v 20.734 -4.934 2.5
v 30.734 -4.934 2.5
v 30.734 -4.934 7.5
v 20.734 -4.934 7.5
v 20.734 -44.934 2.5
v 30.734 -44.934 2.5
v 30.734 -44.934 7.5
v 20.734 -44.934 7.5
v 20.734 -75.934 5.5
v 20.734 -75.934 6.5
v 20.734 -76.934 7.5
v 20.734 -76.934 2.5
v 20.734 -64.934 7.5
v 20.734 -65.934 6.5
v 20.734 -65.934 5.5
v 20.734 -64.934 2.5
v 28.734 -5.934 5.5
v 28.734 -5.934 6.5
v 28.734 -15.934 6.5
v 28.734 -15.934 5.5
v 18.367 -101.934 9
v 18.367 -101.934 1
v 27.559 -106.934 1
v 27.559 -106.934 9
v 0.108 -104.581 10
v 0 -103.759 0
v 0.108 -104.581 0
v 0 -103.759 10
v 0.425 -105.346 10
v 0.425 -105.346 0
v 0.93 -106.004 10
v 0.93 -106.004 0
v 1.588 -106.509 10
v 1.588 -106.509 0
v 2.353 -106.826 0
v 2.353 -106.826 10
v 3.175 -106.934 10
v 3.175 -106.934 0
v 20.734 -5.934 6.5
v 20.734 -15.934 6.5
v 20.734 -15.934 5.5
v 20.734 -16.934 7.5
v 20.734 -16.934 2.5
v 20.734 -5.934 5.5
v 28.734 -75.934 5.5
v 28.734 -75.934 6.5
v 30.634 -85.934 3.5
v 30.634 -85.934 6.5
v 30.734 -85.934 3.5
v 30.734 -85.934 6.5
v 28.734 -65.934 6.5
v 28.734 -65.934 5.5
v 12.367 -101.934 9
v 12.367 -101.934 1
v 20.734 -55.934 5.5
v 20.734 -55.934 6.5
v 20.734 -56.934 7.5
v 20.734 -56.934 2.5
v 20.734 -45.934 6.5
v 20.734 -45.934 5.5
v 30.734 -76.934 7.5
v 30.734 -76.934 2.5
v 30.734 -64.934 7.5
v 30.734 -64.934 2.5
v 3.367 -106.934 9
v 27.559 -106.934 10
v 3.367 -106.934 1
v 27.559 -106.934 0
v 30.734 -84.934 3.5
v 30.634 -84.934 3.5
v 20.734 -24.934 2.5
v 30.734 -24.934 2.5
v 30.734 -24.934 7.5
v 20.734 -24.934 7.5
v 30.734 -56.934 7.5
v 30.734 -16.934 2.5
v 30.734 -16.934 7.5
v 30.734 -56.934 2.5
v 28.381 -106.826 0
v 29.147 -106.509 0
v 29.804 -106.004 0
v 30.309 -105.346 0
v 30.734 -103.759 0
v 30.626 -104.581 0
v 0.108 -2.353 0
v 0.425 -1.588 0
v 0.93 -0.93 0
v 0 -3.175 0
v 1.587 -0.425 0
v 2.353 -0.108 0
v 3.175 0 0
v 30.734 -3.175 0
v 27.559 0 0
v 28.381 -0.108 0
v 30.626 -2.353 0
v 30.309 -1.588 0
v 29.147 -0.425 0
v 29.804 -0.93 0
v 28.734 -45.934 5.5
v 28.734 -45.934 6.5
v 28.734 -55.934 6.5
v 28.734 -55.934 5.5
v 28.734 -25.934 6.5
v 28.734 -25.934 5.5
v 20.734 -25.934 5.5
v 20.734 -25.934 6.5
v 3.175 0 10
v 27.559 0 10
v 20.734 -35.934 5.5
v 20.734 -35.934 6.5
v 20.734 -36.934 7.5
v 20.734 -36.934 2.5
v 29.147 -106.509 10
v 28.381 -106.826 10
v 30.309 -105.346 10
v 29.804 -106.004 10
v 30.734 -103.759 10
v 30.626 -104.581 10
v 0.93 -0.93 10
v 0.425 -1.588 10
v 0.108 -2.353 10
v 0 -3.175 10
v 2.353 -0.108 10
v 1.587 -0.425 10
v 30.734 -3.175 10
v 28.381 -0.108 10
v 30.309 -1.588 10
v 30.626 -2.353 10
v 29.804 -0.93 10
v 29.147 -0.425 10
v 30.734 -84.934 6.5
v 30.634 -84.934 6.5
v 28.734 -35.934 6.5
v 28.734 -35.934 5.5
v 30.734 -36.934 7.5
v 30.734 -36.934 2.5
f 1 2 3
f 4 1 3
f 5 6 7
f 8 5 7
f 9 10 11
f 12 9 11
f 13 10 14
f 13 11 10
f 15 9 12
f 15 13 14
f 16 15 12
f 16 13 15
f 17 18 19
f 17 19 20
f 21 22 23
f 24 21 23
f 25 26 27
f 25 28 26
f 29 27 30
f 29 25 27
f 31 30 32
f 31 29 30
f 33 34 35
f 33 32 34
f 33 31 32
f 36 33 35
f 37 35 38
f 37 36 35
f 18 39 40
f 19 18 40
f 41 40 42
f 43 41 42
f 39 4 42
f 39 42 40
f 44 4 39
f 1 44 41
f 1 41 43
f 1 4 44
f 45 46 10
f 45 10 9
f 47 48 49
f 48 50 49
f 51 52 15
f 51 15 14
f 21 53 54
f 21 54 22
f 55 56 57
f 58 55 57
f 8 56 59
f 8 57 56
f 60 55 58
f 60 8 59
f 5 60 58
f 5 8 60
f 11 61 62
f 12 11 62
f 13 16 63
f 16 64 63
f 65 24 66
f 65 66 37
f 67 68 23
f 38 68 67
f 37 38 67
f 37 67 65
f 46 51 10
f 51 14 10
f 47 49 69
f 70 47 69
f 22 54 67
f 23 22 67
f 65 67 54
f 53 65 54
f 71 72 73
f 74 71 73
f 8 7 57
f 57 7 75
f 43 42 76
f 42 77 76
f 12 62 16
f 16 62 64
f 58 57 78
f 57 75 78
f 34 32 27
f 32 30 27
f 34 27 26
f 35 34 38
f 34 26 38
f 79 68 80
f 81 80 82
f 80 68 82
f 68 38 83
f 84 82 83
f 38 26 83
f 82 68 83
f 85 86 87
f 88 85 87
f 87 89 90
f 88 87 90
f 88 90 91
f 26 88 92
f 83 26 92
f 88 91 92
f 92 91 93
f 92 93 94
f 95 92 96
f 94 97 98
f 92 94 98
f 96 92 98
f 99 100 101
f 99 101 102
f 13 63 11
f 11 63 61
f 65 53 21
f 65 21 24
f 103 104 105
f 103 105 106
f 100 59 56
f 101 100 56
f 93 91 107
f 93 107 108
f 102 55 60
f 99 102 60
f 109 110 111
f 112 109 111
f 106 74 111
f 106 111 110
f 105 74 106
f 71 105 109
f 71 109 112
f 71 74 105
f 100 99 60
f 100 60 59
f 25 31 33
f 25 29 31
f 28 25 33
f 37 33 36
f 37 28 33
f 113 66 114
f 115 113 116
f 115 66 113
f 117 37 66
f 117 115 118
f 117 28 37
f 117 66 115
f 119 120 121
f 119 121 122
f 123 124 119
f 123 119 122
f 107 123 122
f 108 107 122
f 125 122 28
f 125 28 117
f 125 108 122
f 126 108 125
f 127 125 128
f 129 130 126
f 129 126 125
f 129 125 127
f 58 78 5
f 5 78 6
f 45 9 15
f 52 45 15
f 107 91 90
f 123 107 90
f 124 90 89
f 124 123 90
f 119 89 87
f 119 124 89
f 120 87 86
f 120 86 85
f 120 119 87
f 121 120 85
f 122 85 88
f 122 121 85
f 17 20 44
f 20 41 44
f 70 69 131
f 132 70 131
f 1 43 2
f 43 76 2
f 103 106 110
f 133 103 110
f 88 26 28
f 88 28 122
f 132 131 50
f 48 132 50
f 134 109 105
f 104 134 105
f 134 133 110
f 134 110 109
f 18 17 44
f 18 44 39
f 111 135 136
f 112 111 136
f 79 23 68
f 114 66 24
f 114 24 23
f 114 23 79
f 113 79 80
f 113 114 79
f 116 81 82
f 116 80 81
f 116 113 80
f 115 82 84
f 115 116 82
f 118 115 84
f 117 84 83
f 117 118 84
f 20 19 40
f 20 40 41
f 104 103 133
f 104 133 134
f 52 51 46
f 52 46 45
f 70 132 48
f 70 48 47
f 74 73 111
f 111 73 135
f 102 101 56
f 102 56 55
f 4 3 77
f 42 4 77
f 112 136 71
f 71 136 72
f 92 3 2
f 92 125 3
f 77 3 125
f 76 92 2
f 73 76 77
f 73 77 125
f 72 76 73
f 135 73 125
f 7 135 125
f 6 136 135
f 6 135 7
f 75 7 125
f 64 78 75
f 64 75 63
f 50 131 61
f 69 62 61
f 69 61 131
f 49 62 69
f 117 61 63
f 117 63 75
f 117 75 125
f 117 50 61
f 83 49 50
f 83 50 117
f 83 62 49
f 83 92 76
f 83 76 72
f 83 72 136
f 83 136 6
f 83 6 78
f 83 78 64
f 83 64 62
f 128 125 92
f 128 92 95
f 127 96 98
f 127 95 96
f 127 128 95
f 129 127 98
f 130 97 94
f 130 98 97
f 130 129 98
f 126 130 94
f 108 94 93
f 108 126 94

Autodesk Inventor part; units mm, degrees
ref_plane "YZ Plane" through (0, 0, 0) normal (1, 0, 0) x (0, 1, 0)
ref_plane "XZ Plane" through (0, 0, 0) normal (0, 1, 0) x (-1, 0, 0)
ref_plane "XY Plane" through (0, 0, 0) normal (0, 0, 1) x (1, 0, 0)
sketch "Sketch1" plane through (0, 0, 0) normal (0, 0, 1) x (1, 0, 0)
  line L0 (0, 0) -> (30.734, 0)
  line L1 (30.734, 0) -> (30.734, -106.934)
  line L2 (30.734, -106.934) -> (0, -106.934)
  line L3 (0, -106.934) -> (0, 0)
  dimension "d0" = 30.734
  dimension "d1" = 106.934
extrude "Extrusion1" add sketch "Sketch1" along normal blind 10
fillet "Fillet1" radius 3.175 4 edges at (0, 0, 5) (30.734, 0, 5) (30.734, -106.934, 5) (0, -106.934, 5)
sketch "Sketch2" plane through (30.734, -103.759, 0) normal (1, 0, 0) x (0, 0, -1)
  line L0 (-7.5, 26.825) -> (-2.5, 26.825)
  line L1 (-2.5, 26.825) -> (-2.5, 38.825)
  line L2 (-2.5, 38.825) -> (-7.5, 38.825)
  line L3 (-7.5, 38.825) -> (-7.5, 26.825)
  line L4 (-10, -3.175) -> (0, -3.175) projected
  line L5 (-10, -3.175) -> (-10, 0) projected
  line L6 (-7.5, 46.825) -> (-2.5, 46.825)
  line L7 (-2.5, 46.825) -> (-2.5, 58.825)
  line L8 (-2.5, 58.825) -> (-7.5, 58.825)
  line L9 (-7.5, 58.825) -> (-7.5, 46.825)
  line L10 (-7.5, 66.825) -> (-2.5, 66.825)
  line L11 (-2.5, 66.825) -> (-2.5, 78.825)
  line L12 (-2.5, 78.825) -> (-7.5, 78.825)
  line L13 (-7.5, 78.825) -> (-7.5, 66.825)
  line L14 (-7.5, 86.825) -> (-2.5, 86.825)
  line L15 (-2.5, 86.825) -> (-2.5, 98.825)
  line L16 (-2.5, 98.825) -> (-7.5, 98.825)
  line L17 (-7.5, 98.825) -> (-7.5, 86.825)
  point P0 (0, 103.759)
  point P1 (-5, 26.825)
  point P2 (-5, -3.175)
  point P3 (-5, 46.825)
  point P4 (-5, 66.825)
  point P5 (-5, 86.825)
  dimension "d5" = 30
  dimension "d6" = 12
  dimension "d7" = 5
  dimension "d10" = 20
extrude "Extrusion2" cut sketch "Sketch2" against normal blind 10
sketch "Sketch3" plane through (30.734, -103.759, 0) normal (1, 0, 0) x (0, 0, -1)
  line L0 (-6.5, 17.825) -> (-3.5, 17.825)
  line L1 (-3.5, 17.825) -> (-3.5, 18.825)
  line L2 (-3.5, 18.825) -> (-6.5, 18.825)
  line L3 (-6.5, 18.825) -> (-6.5, 17.825)
  line L4 (-10, -3.175) -> (0, -3.175) projected
  point P0 (0, 103.759)
  point P1 (-5, 17.825)
  point P2 (-5, -3.175)
  dimension "d17" = 21
  dimension "d18" = 1
  dimension "d19" = 3
extrude "Extrusion3" cut sketch "Sketch3" against normal blind 0.1
sketch "Sketch4" plane through (20.734, -103.759, 0) normal (1, 0, 0) x (0, 0, -1)
  line L0 (-6.5, 27.825) -> (-5.5, 27.825)
  line L1 (-5.5, 27.825) -> (-5.5, 37.825)
  line L2 (-5.5, 37.825) -> (-6.5, 37.825)
  line L3 (-6.5, 37.825) -> (-6.5, 27.825)
  line L4 (-7.5, 26.825) -> (-7.5, 38.825) projected
  line L5 (-2.5, 26.825) -> (-7.5, 26.825) projected
  line L6 (-7.5, 38.825) -> (-2.5, 38.825) projected
  line L7 (-6.5, 47.825) -> (-5.5, 47.825)
  line L8 (-5.5, 47.825) -> (-5.5, 57.825)
  line L9 (-5.5, 57.825) -> (-6.5, 57.825)
  line L10 (-6.5, 57.825) -> (-6.5, 47.825)
  line L11 (-6.5, 67.825) -> (-5.5, 67.825)
  line L12 (-5.5, 67.825) -> (-5.5, 77.825)
  line L13 (-5.5, 77.825) -> (-6.5, 77.825)
  line L14 (-6.5, 77.825) -> (-6.5, 67.825)
  line L15 (-6.5, 87.825) -> (-5.5, 87.825)
  line L16 (-5.5, 87.825) -> (-5.5, 97.825)
  line L17 (-5.5, 97.825) -> (-6.5, 97.825)
  line L18 (-6.5, 97.825) -> (-6.5, 87.825)
  point P0 (0, 103.759)
  point P1 (-6.5, 32.825)
  point P2 (-7.5, 32.825)
  point P3 (-6.5, 52.825)
  point P4 (-6.5, 72.825)
  point P5 (-6.5, 92.825)
  dimension "d24" = 1
  dimension "d25" = 1
  dimension "d26" = 1
  dimension "d29" = 20
extrude "Extrusion4" add sketch "Sketch4" along normal blind 8
sketch "Sketch5" plane through (3.175, -106.934, 0) normal (0, -1, 0) x (1, 0, 0)
  line L0 (9.192, 9) -> (15.192, 9)
  line L1 (15.192, 9) -> (15.192, 1)
  line L2 (15.192, 1) -> (9.192, 1)
  line L3 (9.192, 1) -> (9.192, 9)
  line L4 (0, 10) -> (24.384, 10) projected
  line L5 (24.384, 0) -> (0, 0) projected
  point P0 (-3.175, 0)
  point P1 (12.192, 9)
  point P2 (12.192, 10)
  dimension "d36" = 6
  dimension "d37" = 1
  dimension "d38" = 1
extrude "Extrusion5" cut sketch "Sketch5" against normal blind 5
sketch "Sketch6" plane through (12.367, -106.934, 1) normal (0, 0, 1) x (1, 0, 0)
  line L0 (6, 0) -> (0, 0) projected
  line L1 (6, 0) -> (6, 5) projected
  line L2 (6, 5) -> (0, 5) projected
  line L3 (0, 0) -> (0, 5) projected
  line L4 (-9, 0) -> (15, 0)
  line L5 (-9, 0) -> (0, 5)
  line L6 (15.192, 0) -> (-9.192, 0) projected
  line L7 (6, 5) -> (15.192, 0)
  point P0 (-12.367, 106.934)
  point P1 (3, 0)
  dimension "d41" = 24
extrude "Extrusion6" cut sketch "Sketch6" along normal blind 8 contours L1 L7 L6 L4 | L4 L5 L3
properties part number "USB Hub" material "ABS Plastic"
